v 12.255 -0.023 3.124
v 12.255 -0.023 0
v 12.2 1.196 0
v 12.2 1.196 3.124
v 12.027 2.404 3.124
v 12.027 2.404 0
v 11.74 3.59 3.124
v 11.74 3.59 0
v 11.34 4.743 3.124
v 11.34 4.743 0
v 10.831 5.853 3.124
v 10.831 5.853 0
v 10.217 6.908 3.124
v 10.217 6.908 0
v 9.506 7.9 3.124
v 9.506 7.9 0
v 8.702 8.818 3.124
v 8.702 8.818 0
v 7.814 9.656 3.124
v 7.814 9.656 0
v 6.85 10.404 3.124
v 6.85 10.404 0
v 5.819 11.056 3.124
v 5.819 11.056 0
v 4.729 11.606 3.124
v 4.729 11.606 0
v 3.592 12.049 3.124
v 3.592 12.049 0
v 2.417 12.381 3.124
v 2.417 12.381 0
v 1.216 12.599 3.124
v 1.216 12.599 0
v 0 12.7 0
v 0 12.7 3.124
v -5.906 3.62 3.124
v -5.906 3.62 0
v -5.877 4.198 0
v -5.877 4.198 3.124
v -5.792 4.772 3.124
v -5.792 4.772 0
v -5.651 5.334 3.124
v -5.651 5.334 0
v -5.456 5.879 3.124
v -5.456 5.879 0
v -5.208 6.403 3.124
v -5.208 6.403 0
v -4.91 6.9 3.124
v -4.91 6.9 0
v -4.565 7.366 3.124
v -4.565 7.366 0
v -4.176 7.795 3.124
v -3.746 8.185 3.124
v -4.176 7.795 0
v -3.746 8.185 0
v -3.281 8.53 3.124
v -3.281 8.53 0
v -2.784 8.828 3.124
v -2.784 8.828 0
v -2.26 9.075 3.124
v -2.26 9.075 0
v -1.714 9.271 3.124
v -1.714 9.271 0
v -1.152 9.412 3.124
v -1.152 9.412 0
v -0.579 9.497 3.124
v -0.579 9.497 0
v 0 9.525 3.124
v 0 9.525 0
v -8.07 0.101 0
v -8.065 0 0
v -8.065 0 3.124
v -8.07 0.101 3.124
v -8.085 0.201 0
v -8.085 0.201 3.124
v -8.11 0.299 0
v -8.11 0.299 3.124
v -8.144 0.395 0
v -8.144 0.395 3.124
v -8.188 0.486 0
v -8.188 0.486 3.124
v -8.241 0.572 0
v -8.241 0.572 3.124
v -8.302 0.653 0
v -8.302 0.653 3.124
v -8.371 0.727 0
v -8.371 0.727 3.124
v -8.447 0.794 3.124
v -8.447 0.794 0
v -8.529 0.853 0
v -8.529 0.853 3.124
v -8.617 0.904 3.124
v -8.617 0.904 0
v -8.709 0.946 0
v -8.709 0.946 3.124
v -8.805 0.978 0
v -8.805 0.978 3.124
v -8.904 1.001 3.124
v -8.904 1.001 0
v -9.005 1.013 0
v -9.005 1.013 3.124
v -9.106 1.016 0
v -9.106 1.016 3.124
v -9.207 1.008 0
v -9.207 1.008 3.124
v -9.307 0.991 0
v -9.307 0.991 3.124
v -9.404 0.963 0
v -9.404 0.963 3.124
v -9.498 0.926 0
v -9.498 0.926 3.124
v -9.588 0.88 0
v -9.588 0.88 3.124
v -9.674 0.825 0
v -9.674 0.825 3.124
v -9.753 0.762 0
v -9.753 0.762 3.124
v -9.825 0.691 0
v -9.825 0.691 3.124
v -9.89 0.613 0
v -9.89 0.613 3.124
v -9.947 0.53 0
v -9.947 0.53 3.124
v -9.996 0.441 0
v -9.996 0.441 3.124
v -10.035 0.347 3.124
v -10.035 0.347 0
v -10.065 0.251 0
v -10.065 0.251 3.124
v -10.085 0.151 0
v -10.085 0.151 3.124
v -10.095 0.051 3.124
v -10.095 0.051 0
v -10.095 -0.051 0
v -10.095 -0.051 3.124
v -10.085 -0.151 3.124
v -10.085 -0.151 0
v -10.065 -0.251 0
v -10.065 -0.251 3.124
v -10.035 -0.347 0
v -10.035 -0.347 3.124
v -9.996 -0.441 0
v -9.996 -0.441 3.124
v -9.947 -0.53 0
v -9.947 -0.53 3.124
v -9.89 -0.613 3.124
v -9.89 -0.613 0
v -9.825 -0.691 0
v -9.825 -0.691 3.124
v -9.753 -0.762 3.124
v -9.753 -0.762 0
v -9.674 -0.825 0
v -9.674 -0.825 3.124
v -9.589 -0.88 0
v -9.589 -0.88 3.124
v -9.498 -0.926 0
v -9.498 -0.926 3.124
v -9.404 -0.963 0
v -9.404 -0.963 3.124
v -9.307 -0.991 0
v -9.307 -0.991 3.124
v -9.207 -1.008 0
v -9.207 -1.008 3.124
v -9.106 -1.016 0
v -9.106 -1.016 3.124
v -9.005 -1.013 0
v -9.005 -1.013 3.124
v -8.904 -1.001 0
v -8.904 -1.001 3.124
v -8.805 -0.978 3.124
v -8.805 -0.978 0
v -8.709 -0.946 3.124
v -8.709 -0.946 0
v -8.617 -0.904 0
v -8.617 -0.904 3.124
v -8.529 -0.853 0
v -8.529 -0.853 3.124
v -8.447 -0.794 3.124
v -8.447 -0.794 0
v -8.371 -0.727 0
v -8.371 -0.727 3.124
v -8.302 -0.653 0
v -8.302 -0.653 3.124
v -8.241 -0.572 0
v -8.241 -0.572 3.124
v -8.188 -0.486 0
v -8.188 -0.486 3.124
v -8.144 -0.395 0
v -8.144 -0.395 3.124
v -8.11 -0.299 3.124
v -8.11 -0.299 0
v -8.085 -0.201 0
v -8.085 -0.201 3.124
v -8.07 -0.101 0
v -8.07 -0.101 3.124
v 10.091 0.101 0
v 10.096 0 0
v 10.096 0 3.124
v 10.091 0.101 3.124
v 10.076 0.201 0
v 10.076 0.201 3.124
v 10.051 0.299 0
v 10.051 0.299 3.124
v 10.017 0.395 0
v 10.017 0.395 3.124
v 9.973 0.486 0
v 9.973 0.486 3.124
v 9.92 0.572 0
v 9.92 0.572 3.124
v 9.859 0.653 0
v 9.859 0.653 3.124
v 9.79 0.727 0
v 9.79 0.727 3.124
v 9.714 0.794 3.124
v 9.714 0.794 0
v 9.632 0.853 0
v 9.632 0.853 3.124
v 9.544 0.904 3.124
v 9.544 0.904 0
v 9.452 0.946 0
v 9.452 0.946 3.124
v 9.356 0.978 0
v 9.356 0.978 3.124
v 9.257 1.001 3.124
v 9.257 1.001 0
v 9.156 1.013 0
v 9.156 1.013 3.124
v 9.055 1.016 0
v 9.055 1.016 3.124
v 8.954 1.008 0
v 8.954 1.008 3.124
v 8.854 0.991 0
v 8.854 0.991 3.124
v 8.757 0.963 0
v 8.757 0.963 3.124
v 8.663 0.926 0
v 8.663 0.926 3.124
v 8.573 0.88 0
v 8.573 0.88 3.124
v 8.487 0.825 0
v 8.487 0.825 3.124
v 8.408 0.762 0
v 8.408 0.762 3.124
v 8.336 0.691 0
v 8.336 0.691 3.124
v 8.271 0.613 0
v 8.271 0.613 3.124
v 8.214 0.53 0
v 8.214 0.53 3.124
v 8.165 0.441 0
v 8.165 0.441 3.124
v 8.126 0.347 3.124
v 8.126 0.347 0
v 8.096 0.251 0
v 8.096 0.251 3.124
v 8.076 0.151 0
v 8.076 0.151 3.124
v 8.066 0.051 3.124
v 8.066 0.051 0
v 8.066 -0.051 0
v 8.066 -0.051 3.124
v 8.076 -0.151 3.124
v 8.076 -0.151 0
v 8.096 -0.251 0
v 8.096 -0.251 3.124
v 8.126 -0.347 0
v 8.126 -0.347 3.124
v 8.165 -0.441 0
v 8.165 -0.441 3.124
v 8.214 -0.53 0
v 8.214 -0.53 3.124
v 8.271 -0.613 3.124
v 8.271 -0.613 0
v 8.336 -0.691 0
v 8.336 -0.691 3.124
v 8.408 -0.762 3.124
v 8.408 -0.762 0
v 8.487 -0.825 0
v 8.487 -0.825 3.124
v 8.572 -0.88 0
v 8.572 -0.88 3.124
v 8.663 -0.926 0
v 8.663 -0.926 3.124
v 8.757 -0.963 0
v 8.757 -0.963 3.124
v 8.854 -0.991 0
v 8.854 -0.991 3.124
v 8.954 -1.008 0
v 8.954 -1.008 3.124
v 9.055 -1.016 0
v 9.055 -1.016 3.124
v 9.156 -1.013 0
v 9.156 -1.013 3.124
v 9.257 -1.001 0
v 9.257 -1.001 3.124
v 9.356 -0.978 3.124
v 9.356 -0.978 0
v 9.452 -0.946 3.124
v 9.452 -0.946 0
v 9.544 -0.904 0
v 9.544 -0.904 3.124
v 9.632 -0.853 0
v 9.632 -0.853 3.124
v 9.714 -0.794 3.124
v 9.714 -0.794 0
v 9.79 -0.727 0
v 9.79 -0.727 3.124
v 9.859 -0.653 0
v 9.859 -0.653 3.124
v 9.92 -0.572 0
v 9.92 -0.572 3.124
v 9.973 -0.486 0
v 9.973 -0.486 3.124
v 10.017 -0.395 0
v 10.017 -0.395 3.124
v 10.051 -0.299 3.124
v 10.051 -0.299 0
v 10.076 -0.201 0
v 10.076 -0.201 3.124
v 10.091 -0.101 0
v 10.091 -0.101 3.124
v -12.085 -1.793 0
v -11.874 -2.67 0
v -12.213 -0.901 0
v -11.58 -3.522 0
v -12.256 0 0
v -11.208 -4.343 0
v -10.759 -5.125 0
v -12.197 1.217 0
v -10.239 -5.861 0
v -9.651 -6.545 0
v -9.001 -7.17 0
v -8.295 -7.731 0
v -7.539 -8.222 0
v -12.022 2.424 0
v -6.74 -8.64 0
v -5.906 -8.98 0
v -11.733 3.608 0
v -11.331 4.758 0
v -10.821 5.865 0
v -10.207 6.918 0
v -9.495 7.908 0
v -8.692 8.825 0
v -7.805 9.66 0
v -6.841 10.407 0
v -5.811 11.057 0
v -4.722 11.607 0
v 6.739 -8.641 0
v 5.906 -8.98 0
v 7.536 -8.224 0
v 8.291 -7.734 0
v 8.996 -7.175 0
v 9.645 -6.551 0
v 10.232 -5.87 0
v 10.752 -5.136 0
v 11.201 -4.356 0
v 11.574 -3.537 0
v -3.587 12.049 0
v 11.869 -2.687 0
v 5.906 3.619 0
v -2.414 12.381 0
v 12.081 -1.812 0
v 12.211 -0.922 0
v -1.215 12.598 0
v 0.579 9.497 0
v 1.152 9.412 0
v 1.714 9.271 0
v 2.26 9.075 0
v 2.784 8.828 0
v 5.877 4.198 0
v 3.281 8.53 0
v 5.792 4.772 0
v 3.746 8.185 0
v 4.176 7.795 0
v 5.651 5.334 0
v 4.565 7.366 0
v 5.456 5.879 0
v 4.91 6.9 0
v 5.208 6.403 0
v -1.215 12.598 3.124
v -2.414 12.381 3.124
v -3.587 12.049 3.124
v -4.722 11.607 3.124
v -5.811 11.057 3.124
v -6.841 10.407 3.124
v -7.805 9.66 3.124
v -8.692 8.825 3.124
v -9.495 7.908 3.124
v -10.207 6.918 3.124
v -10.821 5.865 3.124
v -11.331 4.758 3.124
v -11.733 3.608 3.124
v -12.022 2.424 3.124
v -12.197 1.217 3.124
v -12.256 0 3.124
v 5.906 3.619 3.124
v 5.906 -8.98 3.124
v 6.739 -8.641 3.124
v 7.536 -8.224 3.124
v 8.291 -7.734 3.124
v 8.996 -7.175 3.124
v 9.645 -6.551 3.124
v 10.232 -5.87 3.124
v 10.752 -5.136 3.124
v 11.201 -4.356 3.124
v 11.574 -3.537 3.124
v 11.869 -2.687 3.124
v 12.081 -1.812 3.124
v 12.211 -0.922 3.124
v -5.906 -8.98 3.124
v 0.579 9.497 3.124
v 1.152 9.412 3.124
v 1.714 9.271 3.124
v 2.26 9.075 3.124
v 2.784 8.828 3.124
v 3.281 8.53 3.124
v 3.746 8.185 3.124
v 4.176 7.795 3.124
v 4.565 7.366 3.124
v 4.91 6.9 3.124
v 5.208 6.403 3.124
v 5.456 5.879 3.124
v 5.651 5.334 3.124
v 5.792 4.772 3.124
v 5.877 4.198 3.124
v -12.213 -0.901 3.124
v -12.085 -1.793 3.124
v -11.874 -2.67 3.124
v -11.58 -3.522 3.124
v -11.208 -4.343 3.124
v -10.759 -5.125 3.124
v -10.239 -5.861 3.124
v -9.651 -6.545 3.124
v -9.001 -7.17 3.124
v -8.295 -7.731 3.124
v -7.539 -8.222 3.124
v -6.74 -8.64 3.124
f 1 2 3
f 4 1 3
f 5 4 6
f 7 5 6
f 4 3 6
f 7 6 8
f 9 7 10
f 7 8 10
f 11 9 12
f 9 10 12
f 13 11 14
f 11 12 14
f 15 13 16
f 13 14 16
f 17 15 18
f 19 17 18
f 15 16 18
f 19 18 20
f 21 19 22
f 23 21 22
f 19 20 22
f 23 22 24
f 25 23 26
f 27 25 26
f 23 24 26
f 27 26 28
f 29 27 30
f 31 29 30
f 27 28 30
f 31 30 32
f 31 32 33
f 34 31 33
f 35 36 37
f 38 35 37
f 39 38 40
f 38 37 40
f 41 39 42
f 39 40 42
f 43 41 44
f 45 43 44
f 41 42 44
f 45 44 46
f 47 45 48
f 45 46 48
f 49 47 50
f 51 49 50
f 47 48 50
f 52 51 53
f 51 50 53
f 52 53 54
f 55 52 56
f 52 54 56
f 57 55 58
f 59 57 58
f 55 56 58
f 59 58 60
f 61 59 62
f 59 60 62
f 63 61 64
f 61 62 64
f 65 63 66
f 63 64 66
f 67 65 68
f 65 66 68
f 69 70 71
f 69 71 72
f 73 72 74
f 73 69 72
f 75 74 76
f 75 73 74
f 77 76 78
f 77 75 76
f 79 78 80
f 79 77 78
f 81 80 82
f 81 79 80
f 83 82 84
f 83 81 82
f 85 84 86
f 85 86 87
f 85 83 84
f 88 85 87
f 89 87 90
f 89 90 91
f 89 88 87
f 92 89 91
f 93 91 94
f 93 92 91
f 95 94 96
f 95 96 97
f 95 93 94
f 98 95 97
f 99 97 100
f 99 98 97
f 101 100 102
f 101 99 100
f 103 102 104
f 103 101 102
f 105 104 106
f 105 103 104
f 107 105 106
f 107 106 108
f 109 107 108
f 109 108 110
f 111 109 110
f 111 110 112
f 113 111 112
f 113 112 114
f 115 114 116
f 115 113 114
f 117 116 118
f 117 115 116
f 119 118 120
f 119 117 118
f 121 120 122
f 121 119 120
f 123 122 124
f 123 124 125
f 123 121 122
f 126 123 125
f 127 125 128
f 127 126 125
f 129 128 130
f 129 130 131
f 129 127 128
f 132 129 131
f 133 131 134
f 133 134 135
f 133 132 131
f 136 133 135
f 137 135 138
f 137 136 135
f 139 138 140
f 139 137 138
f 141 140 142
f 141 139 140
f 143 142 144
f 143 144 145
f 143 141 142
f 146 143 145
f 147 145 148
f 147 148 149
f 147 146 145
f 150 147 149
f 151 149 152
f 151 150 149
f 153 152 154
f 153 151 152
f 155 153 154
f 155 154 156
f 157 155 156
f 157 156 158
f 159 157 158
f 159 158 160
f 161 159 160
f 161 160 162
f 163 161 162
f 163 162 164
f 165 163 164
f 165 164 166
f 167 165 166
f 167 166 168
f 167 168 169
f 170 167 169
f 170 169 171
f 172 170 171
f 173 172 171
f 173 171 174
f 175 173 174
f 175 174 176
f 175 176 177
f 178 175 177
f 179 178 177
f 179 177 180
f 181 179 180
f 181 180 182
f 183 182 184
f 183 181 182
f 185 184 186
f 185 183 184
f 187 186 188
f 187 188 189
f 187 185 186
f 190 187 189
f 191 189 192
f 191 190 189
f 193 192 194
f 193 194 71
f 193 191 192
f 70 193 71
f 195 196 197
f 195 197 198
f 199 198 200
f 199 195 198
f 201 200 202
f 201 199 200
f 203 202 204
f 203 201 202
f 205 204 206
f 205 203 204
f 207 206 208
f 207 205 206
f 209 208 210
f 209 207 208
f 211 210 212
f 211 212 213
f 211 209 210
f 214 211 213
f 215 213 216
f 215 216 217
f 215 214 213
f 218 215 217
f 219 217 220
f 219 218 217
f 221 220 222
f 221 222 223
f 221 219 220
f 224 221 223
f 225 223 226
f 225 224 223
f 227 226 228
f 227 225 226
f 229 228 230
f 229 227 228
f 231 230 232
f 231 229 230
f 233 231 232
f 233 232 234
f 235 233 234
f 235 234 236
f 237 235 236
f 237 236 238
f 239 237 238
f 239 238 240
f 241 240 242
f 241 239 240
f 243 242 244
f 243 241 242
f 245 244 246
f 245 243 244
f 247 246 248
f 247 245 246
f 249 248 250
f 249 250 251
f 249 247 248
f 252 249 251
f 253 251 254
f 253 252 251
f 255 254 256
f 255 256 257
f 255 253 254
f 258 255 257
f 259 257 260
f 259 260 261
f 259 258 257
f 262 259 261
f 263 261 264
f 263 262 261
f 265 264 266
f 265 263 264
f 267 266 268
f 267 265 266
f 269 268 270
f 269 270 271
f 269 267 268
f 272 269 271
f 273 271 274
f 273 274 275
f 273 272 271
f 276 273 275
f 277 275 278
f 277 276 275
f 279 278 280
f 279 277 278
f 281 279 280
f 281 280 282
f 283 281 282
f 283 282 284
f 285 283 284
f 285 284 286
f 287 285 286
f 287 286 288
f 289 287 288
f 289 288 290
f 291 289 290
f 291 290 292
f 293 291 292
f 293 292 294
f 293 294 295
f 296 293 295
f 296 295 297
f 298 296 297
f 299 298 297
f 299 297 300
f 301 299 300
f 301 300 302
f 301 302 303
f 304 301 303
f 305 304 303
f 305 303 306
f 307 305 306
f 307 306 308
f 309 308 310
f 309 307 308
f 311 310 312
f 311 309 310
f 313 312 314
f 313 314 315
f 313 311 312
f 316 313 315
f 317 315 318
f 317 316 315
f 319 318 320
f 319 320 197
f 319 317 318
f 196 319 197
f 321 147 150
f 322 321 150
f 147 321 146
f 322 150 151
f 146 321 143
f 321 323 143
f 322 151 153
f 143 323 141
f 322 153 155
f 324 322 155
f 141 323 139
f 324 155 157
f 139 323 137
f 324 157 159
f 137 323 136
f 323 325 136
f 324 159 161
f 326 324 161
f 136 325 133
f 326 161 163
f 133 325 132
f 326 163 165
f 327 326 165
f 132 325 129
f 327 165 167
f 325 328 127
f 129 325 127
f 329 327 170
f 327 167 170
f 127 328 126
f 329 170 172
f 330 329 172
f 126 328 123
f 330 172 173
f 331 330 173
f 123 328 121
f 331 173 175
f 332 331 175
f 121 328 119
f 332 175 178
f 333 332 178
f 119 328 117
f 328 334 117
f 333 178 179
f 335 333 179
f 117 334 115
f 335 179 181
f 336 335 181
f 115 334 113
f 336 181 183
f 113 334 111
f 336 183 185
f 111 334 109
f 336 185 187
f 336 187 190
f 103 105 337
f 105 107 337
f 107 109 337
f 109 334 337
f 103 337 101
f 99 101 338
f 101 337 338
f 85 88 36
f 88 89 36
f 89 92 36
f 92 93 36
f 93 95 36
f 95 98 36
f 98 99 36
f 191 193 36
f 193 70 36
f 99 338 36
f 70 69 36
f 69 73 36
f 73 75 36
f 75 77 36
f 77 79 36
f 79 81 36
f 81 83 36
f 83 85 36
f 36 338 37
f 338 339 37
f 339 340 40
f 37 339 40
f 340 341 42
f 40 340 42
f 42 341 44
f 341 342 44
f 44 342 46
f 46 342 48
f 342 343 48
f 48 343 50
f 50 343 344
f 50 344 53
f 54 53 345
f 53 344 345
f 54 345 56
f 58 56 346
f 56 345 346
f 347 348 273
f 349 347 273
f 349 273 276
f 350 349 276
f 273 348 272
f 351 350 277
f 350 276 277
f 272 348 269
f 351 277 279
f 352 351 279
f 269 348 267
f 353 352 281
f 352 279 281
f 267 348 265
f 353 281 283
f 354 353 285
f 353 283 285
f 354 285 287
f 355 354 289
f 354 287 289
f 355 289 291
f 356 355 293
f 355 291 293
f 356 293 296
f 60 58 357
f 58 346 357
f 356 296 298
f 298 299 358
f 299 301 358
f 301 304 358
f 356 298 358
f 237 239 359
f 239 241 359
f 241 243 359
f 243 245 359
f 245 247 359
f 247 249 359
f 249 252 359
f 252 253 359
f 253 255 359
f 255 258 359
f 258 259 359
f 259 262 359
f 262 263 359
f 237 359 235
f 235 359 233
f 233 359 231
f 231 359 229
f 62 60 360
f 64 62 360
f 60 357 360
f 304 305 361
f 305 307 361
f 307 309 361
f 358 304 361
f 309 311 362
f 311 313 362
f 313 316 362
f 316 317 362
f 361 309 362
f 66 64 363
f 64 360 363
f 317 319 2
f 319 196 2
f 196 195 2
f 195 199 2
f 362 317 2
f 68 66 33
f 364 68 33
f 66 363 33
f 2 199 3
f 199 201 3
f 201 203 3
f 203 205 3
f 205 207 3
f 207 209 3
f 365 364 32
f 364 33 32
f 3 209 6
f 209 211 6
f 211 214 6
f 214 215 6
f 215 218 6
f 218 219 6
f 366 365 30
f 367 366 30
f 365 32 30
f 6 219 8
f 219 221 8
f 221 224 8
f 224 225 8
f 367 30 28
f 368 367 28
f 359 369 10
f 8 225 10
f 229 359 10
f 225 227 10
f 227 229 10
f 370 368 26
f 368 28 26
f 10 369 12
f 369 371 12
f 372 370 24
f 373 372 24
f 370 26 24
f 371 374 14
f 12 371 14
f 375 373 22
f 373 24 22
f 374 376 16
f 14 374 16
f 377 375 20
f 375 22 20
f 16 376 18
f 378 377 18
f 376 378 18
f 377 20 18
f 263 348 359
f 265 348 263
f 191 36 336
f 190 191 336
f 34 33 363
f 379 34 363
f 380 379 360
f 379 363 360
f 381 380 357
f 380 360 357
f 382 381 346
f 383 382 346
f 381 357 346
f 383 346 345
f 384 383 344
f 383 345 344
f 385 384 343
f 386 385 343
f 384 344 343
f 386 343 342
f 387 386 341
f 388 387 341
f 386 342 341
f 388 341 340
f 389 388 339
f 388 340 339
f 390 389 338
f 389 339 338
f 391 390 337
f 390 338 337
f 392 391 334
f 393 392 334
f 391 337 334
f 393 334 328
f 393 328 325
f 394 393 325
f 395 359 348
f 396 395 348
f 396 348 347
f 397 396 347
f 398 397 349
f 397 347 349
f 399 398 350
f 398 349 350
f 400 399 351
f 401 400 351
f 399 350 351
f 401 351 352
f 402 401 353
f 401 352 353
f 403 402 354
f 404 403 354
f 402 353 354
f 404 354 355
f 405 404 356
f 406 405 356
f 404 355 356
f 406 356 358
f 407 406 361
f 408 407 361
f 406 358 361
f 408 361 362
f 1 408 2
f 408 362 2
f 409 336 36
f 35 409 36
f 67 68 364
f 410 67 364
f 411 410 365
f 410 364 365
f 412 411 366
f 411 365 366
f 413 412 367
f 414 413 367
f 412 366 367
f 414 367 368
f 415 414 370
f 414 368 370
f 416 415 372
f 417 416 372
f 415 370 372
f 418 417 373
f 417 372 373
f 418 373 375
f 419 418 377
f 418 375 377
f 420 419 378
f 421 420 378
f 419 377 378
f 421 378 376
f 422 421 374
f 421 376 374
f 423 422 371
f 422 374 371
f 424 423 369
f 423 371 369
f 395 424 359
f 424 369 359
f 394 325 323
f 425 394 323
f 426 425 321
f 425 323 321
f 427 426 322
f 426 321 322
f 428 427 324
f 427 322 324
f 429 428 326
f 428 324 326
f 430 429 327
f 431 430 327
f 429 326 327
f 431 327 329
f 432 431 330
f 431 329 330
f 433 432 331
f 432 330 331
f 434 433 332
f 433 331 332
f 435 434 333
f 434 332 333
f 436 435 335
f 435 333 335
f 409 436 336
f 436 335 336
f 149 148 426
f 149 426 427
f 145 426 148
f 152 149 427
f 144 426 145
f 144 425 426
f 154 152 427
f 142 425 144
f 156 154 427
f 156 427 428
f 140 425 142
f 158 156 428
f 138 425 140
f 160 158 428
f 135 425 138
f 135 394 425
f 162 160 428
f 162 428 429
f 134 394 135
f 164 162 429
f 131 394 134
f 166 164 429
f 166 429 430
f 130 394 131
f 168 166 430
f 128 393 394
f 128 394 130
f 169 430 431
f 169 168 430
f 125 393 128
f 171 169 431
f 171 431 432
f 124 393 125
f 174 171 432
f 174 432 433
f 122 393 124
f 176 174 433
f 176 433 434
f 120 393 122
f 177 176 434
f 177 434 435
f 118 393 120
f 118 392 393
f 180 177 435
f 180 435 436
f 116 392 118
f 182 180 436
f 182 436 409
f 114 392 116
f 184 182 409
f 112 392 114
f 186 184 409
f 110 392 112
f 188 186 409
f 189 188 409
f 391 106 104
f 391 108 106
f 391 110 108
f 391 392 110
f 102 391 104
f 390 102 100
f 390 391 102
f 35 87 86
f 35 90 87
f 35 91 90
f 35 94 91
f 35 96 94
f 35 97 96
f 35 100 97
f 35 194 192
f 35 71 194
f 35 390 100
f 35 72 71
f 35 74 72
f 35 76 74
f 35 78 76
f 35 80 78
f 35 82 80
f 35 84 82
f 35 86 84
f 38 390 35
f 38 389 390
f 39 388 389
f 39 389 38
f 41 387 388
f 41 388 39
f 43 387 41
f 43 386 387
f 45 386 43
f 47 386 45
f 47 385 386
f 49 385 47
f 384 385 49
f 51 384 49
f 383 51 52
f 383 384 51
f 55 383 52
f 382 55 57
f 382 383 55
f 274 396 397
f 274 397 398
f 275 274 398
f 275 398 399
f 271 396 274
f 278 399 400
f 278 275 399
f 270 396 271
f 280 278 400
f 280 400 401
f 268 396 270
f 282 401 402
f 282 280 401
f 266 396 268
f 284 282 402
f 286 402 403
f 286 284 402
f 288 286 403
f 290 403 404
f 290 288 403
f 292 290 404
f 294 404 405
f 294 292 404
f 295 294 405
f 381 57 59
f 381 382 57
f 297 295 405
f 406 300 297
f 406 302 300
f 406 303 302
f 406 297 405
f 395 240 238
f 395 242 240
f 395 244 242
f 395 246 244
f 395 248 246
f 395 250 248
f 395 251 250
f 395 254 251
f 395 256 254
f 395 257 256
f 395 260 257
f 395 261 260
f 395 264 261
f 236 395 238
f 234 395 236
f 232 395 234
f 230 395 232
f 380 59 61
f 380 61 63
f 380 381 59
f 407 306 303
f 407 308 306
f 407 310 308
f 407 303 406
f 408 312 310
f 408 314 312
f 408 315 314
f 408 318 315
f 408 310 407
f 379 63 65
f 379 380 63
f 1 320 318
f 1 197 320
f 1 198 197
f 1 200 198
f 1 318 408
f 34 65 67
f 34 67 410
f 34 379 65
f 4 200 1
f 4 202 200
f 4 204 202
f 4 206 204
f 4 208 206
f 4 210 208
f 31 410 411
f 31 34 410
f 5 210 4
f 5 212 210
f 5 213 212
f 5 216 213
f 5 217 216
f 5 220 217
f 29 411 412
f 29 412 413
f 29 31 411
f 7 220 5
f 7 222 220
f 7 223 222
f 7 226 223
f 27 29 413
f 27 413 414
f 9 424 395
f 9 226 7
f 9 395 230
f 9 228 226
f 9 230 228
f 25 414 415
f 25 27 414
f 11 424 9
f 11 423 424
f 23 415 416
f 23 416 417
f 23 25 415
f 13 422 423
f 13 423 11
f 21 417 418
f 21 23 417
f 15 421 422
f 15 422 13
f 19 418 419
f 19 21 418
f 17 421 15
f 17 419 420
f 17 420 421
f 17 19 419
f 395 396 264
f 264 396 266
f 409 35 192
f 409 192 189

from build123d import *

# Parameters (mm, degrees)
CROQUIS1_R              = 1.016
SALIENTE_EXTRUIR1_DEPTH = 3.1242


with BuildPart() as part:
    # Croquis1 → Saliente-Extruir1 (new body)
    with BuildSketch(Plane.XY):
        with BuildLine():
            Line((0, 9.525), (-2.7305, 9.525))
            ThreePointArc((-2.7305, 9.525), (-9.465692091, 6.735192091), (-12.2555, 0))
            ThreePointArc((-12.2555, 0), (-10.507629933, -5.499261314), (-5.9055, -8.980256121))
            Line((-5.9055, -8.980256121), (-5.9055, -3.6195))
            Line((-5.9055, -3.6195), (-5.9055, 3.6195))
            ThreePointArc((-5.9055, 3.6195), (-4.175819096, 7.795319096), (0, 9.525))
        make_face()
        with Locations((-9.0805, 0)):
            Circle(CROQUIS1_R, mode=Mode.SUBTRACT)
        with BuildLine():
            ThreePointArc((-12.2555, 0), (-9.465692091, 6.735192091), (-2.7305, 9.525))
            Line((-2.7305, 9.525), (0, 9.525))
            Line((0, 9.525), (2.7305, 9.525))
            ThreePointArc((2.7305, 9.525), (9.473939825, 6.726934244), (12.255471398, -0.023342399))
            ThreePointArc((12.255471398, -0.023342399), (8.702367859, 8.818284916), (0, 12.7))
            ThreePointArc((0, 12.7), (-8.691999868, 8.824501123), (-12.2555, 0))
        make_face()
        with BuildLine():
            Line((2.7305, 9.525), (0, 9.525))
            ThreePointArc((0, 9.525), (4.175819096, 7.795319096), (5.9055, 3.6195))
            Line((5.9055, 3.6195), (5.9055, -3.6195))
            Line((5.9055, -3.6195), (5.9055, -8.980256121))
            ThreePointArc((5.9055, -8.980256121), (10.50088572, -5.508786688), (12.255471398, -0.023342399))
            ThreePointArc((12.255471398, -0.023342399), (9.473939825, 6.726934244), (2.7305, 9.525))
        make_face()
        with Locations((9.0805, 0)):
            Circle(CROQUIS1_R, mode=Mode.SUBTRACT)
    extrude(amount=SALIENTE_EXTRUIR1_DEPTH)


solid = part.part
